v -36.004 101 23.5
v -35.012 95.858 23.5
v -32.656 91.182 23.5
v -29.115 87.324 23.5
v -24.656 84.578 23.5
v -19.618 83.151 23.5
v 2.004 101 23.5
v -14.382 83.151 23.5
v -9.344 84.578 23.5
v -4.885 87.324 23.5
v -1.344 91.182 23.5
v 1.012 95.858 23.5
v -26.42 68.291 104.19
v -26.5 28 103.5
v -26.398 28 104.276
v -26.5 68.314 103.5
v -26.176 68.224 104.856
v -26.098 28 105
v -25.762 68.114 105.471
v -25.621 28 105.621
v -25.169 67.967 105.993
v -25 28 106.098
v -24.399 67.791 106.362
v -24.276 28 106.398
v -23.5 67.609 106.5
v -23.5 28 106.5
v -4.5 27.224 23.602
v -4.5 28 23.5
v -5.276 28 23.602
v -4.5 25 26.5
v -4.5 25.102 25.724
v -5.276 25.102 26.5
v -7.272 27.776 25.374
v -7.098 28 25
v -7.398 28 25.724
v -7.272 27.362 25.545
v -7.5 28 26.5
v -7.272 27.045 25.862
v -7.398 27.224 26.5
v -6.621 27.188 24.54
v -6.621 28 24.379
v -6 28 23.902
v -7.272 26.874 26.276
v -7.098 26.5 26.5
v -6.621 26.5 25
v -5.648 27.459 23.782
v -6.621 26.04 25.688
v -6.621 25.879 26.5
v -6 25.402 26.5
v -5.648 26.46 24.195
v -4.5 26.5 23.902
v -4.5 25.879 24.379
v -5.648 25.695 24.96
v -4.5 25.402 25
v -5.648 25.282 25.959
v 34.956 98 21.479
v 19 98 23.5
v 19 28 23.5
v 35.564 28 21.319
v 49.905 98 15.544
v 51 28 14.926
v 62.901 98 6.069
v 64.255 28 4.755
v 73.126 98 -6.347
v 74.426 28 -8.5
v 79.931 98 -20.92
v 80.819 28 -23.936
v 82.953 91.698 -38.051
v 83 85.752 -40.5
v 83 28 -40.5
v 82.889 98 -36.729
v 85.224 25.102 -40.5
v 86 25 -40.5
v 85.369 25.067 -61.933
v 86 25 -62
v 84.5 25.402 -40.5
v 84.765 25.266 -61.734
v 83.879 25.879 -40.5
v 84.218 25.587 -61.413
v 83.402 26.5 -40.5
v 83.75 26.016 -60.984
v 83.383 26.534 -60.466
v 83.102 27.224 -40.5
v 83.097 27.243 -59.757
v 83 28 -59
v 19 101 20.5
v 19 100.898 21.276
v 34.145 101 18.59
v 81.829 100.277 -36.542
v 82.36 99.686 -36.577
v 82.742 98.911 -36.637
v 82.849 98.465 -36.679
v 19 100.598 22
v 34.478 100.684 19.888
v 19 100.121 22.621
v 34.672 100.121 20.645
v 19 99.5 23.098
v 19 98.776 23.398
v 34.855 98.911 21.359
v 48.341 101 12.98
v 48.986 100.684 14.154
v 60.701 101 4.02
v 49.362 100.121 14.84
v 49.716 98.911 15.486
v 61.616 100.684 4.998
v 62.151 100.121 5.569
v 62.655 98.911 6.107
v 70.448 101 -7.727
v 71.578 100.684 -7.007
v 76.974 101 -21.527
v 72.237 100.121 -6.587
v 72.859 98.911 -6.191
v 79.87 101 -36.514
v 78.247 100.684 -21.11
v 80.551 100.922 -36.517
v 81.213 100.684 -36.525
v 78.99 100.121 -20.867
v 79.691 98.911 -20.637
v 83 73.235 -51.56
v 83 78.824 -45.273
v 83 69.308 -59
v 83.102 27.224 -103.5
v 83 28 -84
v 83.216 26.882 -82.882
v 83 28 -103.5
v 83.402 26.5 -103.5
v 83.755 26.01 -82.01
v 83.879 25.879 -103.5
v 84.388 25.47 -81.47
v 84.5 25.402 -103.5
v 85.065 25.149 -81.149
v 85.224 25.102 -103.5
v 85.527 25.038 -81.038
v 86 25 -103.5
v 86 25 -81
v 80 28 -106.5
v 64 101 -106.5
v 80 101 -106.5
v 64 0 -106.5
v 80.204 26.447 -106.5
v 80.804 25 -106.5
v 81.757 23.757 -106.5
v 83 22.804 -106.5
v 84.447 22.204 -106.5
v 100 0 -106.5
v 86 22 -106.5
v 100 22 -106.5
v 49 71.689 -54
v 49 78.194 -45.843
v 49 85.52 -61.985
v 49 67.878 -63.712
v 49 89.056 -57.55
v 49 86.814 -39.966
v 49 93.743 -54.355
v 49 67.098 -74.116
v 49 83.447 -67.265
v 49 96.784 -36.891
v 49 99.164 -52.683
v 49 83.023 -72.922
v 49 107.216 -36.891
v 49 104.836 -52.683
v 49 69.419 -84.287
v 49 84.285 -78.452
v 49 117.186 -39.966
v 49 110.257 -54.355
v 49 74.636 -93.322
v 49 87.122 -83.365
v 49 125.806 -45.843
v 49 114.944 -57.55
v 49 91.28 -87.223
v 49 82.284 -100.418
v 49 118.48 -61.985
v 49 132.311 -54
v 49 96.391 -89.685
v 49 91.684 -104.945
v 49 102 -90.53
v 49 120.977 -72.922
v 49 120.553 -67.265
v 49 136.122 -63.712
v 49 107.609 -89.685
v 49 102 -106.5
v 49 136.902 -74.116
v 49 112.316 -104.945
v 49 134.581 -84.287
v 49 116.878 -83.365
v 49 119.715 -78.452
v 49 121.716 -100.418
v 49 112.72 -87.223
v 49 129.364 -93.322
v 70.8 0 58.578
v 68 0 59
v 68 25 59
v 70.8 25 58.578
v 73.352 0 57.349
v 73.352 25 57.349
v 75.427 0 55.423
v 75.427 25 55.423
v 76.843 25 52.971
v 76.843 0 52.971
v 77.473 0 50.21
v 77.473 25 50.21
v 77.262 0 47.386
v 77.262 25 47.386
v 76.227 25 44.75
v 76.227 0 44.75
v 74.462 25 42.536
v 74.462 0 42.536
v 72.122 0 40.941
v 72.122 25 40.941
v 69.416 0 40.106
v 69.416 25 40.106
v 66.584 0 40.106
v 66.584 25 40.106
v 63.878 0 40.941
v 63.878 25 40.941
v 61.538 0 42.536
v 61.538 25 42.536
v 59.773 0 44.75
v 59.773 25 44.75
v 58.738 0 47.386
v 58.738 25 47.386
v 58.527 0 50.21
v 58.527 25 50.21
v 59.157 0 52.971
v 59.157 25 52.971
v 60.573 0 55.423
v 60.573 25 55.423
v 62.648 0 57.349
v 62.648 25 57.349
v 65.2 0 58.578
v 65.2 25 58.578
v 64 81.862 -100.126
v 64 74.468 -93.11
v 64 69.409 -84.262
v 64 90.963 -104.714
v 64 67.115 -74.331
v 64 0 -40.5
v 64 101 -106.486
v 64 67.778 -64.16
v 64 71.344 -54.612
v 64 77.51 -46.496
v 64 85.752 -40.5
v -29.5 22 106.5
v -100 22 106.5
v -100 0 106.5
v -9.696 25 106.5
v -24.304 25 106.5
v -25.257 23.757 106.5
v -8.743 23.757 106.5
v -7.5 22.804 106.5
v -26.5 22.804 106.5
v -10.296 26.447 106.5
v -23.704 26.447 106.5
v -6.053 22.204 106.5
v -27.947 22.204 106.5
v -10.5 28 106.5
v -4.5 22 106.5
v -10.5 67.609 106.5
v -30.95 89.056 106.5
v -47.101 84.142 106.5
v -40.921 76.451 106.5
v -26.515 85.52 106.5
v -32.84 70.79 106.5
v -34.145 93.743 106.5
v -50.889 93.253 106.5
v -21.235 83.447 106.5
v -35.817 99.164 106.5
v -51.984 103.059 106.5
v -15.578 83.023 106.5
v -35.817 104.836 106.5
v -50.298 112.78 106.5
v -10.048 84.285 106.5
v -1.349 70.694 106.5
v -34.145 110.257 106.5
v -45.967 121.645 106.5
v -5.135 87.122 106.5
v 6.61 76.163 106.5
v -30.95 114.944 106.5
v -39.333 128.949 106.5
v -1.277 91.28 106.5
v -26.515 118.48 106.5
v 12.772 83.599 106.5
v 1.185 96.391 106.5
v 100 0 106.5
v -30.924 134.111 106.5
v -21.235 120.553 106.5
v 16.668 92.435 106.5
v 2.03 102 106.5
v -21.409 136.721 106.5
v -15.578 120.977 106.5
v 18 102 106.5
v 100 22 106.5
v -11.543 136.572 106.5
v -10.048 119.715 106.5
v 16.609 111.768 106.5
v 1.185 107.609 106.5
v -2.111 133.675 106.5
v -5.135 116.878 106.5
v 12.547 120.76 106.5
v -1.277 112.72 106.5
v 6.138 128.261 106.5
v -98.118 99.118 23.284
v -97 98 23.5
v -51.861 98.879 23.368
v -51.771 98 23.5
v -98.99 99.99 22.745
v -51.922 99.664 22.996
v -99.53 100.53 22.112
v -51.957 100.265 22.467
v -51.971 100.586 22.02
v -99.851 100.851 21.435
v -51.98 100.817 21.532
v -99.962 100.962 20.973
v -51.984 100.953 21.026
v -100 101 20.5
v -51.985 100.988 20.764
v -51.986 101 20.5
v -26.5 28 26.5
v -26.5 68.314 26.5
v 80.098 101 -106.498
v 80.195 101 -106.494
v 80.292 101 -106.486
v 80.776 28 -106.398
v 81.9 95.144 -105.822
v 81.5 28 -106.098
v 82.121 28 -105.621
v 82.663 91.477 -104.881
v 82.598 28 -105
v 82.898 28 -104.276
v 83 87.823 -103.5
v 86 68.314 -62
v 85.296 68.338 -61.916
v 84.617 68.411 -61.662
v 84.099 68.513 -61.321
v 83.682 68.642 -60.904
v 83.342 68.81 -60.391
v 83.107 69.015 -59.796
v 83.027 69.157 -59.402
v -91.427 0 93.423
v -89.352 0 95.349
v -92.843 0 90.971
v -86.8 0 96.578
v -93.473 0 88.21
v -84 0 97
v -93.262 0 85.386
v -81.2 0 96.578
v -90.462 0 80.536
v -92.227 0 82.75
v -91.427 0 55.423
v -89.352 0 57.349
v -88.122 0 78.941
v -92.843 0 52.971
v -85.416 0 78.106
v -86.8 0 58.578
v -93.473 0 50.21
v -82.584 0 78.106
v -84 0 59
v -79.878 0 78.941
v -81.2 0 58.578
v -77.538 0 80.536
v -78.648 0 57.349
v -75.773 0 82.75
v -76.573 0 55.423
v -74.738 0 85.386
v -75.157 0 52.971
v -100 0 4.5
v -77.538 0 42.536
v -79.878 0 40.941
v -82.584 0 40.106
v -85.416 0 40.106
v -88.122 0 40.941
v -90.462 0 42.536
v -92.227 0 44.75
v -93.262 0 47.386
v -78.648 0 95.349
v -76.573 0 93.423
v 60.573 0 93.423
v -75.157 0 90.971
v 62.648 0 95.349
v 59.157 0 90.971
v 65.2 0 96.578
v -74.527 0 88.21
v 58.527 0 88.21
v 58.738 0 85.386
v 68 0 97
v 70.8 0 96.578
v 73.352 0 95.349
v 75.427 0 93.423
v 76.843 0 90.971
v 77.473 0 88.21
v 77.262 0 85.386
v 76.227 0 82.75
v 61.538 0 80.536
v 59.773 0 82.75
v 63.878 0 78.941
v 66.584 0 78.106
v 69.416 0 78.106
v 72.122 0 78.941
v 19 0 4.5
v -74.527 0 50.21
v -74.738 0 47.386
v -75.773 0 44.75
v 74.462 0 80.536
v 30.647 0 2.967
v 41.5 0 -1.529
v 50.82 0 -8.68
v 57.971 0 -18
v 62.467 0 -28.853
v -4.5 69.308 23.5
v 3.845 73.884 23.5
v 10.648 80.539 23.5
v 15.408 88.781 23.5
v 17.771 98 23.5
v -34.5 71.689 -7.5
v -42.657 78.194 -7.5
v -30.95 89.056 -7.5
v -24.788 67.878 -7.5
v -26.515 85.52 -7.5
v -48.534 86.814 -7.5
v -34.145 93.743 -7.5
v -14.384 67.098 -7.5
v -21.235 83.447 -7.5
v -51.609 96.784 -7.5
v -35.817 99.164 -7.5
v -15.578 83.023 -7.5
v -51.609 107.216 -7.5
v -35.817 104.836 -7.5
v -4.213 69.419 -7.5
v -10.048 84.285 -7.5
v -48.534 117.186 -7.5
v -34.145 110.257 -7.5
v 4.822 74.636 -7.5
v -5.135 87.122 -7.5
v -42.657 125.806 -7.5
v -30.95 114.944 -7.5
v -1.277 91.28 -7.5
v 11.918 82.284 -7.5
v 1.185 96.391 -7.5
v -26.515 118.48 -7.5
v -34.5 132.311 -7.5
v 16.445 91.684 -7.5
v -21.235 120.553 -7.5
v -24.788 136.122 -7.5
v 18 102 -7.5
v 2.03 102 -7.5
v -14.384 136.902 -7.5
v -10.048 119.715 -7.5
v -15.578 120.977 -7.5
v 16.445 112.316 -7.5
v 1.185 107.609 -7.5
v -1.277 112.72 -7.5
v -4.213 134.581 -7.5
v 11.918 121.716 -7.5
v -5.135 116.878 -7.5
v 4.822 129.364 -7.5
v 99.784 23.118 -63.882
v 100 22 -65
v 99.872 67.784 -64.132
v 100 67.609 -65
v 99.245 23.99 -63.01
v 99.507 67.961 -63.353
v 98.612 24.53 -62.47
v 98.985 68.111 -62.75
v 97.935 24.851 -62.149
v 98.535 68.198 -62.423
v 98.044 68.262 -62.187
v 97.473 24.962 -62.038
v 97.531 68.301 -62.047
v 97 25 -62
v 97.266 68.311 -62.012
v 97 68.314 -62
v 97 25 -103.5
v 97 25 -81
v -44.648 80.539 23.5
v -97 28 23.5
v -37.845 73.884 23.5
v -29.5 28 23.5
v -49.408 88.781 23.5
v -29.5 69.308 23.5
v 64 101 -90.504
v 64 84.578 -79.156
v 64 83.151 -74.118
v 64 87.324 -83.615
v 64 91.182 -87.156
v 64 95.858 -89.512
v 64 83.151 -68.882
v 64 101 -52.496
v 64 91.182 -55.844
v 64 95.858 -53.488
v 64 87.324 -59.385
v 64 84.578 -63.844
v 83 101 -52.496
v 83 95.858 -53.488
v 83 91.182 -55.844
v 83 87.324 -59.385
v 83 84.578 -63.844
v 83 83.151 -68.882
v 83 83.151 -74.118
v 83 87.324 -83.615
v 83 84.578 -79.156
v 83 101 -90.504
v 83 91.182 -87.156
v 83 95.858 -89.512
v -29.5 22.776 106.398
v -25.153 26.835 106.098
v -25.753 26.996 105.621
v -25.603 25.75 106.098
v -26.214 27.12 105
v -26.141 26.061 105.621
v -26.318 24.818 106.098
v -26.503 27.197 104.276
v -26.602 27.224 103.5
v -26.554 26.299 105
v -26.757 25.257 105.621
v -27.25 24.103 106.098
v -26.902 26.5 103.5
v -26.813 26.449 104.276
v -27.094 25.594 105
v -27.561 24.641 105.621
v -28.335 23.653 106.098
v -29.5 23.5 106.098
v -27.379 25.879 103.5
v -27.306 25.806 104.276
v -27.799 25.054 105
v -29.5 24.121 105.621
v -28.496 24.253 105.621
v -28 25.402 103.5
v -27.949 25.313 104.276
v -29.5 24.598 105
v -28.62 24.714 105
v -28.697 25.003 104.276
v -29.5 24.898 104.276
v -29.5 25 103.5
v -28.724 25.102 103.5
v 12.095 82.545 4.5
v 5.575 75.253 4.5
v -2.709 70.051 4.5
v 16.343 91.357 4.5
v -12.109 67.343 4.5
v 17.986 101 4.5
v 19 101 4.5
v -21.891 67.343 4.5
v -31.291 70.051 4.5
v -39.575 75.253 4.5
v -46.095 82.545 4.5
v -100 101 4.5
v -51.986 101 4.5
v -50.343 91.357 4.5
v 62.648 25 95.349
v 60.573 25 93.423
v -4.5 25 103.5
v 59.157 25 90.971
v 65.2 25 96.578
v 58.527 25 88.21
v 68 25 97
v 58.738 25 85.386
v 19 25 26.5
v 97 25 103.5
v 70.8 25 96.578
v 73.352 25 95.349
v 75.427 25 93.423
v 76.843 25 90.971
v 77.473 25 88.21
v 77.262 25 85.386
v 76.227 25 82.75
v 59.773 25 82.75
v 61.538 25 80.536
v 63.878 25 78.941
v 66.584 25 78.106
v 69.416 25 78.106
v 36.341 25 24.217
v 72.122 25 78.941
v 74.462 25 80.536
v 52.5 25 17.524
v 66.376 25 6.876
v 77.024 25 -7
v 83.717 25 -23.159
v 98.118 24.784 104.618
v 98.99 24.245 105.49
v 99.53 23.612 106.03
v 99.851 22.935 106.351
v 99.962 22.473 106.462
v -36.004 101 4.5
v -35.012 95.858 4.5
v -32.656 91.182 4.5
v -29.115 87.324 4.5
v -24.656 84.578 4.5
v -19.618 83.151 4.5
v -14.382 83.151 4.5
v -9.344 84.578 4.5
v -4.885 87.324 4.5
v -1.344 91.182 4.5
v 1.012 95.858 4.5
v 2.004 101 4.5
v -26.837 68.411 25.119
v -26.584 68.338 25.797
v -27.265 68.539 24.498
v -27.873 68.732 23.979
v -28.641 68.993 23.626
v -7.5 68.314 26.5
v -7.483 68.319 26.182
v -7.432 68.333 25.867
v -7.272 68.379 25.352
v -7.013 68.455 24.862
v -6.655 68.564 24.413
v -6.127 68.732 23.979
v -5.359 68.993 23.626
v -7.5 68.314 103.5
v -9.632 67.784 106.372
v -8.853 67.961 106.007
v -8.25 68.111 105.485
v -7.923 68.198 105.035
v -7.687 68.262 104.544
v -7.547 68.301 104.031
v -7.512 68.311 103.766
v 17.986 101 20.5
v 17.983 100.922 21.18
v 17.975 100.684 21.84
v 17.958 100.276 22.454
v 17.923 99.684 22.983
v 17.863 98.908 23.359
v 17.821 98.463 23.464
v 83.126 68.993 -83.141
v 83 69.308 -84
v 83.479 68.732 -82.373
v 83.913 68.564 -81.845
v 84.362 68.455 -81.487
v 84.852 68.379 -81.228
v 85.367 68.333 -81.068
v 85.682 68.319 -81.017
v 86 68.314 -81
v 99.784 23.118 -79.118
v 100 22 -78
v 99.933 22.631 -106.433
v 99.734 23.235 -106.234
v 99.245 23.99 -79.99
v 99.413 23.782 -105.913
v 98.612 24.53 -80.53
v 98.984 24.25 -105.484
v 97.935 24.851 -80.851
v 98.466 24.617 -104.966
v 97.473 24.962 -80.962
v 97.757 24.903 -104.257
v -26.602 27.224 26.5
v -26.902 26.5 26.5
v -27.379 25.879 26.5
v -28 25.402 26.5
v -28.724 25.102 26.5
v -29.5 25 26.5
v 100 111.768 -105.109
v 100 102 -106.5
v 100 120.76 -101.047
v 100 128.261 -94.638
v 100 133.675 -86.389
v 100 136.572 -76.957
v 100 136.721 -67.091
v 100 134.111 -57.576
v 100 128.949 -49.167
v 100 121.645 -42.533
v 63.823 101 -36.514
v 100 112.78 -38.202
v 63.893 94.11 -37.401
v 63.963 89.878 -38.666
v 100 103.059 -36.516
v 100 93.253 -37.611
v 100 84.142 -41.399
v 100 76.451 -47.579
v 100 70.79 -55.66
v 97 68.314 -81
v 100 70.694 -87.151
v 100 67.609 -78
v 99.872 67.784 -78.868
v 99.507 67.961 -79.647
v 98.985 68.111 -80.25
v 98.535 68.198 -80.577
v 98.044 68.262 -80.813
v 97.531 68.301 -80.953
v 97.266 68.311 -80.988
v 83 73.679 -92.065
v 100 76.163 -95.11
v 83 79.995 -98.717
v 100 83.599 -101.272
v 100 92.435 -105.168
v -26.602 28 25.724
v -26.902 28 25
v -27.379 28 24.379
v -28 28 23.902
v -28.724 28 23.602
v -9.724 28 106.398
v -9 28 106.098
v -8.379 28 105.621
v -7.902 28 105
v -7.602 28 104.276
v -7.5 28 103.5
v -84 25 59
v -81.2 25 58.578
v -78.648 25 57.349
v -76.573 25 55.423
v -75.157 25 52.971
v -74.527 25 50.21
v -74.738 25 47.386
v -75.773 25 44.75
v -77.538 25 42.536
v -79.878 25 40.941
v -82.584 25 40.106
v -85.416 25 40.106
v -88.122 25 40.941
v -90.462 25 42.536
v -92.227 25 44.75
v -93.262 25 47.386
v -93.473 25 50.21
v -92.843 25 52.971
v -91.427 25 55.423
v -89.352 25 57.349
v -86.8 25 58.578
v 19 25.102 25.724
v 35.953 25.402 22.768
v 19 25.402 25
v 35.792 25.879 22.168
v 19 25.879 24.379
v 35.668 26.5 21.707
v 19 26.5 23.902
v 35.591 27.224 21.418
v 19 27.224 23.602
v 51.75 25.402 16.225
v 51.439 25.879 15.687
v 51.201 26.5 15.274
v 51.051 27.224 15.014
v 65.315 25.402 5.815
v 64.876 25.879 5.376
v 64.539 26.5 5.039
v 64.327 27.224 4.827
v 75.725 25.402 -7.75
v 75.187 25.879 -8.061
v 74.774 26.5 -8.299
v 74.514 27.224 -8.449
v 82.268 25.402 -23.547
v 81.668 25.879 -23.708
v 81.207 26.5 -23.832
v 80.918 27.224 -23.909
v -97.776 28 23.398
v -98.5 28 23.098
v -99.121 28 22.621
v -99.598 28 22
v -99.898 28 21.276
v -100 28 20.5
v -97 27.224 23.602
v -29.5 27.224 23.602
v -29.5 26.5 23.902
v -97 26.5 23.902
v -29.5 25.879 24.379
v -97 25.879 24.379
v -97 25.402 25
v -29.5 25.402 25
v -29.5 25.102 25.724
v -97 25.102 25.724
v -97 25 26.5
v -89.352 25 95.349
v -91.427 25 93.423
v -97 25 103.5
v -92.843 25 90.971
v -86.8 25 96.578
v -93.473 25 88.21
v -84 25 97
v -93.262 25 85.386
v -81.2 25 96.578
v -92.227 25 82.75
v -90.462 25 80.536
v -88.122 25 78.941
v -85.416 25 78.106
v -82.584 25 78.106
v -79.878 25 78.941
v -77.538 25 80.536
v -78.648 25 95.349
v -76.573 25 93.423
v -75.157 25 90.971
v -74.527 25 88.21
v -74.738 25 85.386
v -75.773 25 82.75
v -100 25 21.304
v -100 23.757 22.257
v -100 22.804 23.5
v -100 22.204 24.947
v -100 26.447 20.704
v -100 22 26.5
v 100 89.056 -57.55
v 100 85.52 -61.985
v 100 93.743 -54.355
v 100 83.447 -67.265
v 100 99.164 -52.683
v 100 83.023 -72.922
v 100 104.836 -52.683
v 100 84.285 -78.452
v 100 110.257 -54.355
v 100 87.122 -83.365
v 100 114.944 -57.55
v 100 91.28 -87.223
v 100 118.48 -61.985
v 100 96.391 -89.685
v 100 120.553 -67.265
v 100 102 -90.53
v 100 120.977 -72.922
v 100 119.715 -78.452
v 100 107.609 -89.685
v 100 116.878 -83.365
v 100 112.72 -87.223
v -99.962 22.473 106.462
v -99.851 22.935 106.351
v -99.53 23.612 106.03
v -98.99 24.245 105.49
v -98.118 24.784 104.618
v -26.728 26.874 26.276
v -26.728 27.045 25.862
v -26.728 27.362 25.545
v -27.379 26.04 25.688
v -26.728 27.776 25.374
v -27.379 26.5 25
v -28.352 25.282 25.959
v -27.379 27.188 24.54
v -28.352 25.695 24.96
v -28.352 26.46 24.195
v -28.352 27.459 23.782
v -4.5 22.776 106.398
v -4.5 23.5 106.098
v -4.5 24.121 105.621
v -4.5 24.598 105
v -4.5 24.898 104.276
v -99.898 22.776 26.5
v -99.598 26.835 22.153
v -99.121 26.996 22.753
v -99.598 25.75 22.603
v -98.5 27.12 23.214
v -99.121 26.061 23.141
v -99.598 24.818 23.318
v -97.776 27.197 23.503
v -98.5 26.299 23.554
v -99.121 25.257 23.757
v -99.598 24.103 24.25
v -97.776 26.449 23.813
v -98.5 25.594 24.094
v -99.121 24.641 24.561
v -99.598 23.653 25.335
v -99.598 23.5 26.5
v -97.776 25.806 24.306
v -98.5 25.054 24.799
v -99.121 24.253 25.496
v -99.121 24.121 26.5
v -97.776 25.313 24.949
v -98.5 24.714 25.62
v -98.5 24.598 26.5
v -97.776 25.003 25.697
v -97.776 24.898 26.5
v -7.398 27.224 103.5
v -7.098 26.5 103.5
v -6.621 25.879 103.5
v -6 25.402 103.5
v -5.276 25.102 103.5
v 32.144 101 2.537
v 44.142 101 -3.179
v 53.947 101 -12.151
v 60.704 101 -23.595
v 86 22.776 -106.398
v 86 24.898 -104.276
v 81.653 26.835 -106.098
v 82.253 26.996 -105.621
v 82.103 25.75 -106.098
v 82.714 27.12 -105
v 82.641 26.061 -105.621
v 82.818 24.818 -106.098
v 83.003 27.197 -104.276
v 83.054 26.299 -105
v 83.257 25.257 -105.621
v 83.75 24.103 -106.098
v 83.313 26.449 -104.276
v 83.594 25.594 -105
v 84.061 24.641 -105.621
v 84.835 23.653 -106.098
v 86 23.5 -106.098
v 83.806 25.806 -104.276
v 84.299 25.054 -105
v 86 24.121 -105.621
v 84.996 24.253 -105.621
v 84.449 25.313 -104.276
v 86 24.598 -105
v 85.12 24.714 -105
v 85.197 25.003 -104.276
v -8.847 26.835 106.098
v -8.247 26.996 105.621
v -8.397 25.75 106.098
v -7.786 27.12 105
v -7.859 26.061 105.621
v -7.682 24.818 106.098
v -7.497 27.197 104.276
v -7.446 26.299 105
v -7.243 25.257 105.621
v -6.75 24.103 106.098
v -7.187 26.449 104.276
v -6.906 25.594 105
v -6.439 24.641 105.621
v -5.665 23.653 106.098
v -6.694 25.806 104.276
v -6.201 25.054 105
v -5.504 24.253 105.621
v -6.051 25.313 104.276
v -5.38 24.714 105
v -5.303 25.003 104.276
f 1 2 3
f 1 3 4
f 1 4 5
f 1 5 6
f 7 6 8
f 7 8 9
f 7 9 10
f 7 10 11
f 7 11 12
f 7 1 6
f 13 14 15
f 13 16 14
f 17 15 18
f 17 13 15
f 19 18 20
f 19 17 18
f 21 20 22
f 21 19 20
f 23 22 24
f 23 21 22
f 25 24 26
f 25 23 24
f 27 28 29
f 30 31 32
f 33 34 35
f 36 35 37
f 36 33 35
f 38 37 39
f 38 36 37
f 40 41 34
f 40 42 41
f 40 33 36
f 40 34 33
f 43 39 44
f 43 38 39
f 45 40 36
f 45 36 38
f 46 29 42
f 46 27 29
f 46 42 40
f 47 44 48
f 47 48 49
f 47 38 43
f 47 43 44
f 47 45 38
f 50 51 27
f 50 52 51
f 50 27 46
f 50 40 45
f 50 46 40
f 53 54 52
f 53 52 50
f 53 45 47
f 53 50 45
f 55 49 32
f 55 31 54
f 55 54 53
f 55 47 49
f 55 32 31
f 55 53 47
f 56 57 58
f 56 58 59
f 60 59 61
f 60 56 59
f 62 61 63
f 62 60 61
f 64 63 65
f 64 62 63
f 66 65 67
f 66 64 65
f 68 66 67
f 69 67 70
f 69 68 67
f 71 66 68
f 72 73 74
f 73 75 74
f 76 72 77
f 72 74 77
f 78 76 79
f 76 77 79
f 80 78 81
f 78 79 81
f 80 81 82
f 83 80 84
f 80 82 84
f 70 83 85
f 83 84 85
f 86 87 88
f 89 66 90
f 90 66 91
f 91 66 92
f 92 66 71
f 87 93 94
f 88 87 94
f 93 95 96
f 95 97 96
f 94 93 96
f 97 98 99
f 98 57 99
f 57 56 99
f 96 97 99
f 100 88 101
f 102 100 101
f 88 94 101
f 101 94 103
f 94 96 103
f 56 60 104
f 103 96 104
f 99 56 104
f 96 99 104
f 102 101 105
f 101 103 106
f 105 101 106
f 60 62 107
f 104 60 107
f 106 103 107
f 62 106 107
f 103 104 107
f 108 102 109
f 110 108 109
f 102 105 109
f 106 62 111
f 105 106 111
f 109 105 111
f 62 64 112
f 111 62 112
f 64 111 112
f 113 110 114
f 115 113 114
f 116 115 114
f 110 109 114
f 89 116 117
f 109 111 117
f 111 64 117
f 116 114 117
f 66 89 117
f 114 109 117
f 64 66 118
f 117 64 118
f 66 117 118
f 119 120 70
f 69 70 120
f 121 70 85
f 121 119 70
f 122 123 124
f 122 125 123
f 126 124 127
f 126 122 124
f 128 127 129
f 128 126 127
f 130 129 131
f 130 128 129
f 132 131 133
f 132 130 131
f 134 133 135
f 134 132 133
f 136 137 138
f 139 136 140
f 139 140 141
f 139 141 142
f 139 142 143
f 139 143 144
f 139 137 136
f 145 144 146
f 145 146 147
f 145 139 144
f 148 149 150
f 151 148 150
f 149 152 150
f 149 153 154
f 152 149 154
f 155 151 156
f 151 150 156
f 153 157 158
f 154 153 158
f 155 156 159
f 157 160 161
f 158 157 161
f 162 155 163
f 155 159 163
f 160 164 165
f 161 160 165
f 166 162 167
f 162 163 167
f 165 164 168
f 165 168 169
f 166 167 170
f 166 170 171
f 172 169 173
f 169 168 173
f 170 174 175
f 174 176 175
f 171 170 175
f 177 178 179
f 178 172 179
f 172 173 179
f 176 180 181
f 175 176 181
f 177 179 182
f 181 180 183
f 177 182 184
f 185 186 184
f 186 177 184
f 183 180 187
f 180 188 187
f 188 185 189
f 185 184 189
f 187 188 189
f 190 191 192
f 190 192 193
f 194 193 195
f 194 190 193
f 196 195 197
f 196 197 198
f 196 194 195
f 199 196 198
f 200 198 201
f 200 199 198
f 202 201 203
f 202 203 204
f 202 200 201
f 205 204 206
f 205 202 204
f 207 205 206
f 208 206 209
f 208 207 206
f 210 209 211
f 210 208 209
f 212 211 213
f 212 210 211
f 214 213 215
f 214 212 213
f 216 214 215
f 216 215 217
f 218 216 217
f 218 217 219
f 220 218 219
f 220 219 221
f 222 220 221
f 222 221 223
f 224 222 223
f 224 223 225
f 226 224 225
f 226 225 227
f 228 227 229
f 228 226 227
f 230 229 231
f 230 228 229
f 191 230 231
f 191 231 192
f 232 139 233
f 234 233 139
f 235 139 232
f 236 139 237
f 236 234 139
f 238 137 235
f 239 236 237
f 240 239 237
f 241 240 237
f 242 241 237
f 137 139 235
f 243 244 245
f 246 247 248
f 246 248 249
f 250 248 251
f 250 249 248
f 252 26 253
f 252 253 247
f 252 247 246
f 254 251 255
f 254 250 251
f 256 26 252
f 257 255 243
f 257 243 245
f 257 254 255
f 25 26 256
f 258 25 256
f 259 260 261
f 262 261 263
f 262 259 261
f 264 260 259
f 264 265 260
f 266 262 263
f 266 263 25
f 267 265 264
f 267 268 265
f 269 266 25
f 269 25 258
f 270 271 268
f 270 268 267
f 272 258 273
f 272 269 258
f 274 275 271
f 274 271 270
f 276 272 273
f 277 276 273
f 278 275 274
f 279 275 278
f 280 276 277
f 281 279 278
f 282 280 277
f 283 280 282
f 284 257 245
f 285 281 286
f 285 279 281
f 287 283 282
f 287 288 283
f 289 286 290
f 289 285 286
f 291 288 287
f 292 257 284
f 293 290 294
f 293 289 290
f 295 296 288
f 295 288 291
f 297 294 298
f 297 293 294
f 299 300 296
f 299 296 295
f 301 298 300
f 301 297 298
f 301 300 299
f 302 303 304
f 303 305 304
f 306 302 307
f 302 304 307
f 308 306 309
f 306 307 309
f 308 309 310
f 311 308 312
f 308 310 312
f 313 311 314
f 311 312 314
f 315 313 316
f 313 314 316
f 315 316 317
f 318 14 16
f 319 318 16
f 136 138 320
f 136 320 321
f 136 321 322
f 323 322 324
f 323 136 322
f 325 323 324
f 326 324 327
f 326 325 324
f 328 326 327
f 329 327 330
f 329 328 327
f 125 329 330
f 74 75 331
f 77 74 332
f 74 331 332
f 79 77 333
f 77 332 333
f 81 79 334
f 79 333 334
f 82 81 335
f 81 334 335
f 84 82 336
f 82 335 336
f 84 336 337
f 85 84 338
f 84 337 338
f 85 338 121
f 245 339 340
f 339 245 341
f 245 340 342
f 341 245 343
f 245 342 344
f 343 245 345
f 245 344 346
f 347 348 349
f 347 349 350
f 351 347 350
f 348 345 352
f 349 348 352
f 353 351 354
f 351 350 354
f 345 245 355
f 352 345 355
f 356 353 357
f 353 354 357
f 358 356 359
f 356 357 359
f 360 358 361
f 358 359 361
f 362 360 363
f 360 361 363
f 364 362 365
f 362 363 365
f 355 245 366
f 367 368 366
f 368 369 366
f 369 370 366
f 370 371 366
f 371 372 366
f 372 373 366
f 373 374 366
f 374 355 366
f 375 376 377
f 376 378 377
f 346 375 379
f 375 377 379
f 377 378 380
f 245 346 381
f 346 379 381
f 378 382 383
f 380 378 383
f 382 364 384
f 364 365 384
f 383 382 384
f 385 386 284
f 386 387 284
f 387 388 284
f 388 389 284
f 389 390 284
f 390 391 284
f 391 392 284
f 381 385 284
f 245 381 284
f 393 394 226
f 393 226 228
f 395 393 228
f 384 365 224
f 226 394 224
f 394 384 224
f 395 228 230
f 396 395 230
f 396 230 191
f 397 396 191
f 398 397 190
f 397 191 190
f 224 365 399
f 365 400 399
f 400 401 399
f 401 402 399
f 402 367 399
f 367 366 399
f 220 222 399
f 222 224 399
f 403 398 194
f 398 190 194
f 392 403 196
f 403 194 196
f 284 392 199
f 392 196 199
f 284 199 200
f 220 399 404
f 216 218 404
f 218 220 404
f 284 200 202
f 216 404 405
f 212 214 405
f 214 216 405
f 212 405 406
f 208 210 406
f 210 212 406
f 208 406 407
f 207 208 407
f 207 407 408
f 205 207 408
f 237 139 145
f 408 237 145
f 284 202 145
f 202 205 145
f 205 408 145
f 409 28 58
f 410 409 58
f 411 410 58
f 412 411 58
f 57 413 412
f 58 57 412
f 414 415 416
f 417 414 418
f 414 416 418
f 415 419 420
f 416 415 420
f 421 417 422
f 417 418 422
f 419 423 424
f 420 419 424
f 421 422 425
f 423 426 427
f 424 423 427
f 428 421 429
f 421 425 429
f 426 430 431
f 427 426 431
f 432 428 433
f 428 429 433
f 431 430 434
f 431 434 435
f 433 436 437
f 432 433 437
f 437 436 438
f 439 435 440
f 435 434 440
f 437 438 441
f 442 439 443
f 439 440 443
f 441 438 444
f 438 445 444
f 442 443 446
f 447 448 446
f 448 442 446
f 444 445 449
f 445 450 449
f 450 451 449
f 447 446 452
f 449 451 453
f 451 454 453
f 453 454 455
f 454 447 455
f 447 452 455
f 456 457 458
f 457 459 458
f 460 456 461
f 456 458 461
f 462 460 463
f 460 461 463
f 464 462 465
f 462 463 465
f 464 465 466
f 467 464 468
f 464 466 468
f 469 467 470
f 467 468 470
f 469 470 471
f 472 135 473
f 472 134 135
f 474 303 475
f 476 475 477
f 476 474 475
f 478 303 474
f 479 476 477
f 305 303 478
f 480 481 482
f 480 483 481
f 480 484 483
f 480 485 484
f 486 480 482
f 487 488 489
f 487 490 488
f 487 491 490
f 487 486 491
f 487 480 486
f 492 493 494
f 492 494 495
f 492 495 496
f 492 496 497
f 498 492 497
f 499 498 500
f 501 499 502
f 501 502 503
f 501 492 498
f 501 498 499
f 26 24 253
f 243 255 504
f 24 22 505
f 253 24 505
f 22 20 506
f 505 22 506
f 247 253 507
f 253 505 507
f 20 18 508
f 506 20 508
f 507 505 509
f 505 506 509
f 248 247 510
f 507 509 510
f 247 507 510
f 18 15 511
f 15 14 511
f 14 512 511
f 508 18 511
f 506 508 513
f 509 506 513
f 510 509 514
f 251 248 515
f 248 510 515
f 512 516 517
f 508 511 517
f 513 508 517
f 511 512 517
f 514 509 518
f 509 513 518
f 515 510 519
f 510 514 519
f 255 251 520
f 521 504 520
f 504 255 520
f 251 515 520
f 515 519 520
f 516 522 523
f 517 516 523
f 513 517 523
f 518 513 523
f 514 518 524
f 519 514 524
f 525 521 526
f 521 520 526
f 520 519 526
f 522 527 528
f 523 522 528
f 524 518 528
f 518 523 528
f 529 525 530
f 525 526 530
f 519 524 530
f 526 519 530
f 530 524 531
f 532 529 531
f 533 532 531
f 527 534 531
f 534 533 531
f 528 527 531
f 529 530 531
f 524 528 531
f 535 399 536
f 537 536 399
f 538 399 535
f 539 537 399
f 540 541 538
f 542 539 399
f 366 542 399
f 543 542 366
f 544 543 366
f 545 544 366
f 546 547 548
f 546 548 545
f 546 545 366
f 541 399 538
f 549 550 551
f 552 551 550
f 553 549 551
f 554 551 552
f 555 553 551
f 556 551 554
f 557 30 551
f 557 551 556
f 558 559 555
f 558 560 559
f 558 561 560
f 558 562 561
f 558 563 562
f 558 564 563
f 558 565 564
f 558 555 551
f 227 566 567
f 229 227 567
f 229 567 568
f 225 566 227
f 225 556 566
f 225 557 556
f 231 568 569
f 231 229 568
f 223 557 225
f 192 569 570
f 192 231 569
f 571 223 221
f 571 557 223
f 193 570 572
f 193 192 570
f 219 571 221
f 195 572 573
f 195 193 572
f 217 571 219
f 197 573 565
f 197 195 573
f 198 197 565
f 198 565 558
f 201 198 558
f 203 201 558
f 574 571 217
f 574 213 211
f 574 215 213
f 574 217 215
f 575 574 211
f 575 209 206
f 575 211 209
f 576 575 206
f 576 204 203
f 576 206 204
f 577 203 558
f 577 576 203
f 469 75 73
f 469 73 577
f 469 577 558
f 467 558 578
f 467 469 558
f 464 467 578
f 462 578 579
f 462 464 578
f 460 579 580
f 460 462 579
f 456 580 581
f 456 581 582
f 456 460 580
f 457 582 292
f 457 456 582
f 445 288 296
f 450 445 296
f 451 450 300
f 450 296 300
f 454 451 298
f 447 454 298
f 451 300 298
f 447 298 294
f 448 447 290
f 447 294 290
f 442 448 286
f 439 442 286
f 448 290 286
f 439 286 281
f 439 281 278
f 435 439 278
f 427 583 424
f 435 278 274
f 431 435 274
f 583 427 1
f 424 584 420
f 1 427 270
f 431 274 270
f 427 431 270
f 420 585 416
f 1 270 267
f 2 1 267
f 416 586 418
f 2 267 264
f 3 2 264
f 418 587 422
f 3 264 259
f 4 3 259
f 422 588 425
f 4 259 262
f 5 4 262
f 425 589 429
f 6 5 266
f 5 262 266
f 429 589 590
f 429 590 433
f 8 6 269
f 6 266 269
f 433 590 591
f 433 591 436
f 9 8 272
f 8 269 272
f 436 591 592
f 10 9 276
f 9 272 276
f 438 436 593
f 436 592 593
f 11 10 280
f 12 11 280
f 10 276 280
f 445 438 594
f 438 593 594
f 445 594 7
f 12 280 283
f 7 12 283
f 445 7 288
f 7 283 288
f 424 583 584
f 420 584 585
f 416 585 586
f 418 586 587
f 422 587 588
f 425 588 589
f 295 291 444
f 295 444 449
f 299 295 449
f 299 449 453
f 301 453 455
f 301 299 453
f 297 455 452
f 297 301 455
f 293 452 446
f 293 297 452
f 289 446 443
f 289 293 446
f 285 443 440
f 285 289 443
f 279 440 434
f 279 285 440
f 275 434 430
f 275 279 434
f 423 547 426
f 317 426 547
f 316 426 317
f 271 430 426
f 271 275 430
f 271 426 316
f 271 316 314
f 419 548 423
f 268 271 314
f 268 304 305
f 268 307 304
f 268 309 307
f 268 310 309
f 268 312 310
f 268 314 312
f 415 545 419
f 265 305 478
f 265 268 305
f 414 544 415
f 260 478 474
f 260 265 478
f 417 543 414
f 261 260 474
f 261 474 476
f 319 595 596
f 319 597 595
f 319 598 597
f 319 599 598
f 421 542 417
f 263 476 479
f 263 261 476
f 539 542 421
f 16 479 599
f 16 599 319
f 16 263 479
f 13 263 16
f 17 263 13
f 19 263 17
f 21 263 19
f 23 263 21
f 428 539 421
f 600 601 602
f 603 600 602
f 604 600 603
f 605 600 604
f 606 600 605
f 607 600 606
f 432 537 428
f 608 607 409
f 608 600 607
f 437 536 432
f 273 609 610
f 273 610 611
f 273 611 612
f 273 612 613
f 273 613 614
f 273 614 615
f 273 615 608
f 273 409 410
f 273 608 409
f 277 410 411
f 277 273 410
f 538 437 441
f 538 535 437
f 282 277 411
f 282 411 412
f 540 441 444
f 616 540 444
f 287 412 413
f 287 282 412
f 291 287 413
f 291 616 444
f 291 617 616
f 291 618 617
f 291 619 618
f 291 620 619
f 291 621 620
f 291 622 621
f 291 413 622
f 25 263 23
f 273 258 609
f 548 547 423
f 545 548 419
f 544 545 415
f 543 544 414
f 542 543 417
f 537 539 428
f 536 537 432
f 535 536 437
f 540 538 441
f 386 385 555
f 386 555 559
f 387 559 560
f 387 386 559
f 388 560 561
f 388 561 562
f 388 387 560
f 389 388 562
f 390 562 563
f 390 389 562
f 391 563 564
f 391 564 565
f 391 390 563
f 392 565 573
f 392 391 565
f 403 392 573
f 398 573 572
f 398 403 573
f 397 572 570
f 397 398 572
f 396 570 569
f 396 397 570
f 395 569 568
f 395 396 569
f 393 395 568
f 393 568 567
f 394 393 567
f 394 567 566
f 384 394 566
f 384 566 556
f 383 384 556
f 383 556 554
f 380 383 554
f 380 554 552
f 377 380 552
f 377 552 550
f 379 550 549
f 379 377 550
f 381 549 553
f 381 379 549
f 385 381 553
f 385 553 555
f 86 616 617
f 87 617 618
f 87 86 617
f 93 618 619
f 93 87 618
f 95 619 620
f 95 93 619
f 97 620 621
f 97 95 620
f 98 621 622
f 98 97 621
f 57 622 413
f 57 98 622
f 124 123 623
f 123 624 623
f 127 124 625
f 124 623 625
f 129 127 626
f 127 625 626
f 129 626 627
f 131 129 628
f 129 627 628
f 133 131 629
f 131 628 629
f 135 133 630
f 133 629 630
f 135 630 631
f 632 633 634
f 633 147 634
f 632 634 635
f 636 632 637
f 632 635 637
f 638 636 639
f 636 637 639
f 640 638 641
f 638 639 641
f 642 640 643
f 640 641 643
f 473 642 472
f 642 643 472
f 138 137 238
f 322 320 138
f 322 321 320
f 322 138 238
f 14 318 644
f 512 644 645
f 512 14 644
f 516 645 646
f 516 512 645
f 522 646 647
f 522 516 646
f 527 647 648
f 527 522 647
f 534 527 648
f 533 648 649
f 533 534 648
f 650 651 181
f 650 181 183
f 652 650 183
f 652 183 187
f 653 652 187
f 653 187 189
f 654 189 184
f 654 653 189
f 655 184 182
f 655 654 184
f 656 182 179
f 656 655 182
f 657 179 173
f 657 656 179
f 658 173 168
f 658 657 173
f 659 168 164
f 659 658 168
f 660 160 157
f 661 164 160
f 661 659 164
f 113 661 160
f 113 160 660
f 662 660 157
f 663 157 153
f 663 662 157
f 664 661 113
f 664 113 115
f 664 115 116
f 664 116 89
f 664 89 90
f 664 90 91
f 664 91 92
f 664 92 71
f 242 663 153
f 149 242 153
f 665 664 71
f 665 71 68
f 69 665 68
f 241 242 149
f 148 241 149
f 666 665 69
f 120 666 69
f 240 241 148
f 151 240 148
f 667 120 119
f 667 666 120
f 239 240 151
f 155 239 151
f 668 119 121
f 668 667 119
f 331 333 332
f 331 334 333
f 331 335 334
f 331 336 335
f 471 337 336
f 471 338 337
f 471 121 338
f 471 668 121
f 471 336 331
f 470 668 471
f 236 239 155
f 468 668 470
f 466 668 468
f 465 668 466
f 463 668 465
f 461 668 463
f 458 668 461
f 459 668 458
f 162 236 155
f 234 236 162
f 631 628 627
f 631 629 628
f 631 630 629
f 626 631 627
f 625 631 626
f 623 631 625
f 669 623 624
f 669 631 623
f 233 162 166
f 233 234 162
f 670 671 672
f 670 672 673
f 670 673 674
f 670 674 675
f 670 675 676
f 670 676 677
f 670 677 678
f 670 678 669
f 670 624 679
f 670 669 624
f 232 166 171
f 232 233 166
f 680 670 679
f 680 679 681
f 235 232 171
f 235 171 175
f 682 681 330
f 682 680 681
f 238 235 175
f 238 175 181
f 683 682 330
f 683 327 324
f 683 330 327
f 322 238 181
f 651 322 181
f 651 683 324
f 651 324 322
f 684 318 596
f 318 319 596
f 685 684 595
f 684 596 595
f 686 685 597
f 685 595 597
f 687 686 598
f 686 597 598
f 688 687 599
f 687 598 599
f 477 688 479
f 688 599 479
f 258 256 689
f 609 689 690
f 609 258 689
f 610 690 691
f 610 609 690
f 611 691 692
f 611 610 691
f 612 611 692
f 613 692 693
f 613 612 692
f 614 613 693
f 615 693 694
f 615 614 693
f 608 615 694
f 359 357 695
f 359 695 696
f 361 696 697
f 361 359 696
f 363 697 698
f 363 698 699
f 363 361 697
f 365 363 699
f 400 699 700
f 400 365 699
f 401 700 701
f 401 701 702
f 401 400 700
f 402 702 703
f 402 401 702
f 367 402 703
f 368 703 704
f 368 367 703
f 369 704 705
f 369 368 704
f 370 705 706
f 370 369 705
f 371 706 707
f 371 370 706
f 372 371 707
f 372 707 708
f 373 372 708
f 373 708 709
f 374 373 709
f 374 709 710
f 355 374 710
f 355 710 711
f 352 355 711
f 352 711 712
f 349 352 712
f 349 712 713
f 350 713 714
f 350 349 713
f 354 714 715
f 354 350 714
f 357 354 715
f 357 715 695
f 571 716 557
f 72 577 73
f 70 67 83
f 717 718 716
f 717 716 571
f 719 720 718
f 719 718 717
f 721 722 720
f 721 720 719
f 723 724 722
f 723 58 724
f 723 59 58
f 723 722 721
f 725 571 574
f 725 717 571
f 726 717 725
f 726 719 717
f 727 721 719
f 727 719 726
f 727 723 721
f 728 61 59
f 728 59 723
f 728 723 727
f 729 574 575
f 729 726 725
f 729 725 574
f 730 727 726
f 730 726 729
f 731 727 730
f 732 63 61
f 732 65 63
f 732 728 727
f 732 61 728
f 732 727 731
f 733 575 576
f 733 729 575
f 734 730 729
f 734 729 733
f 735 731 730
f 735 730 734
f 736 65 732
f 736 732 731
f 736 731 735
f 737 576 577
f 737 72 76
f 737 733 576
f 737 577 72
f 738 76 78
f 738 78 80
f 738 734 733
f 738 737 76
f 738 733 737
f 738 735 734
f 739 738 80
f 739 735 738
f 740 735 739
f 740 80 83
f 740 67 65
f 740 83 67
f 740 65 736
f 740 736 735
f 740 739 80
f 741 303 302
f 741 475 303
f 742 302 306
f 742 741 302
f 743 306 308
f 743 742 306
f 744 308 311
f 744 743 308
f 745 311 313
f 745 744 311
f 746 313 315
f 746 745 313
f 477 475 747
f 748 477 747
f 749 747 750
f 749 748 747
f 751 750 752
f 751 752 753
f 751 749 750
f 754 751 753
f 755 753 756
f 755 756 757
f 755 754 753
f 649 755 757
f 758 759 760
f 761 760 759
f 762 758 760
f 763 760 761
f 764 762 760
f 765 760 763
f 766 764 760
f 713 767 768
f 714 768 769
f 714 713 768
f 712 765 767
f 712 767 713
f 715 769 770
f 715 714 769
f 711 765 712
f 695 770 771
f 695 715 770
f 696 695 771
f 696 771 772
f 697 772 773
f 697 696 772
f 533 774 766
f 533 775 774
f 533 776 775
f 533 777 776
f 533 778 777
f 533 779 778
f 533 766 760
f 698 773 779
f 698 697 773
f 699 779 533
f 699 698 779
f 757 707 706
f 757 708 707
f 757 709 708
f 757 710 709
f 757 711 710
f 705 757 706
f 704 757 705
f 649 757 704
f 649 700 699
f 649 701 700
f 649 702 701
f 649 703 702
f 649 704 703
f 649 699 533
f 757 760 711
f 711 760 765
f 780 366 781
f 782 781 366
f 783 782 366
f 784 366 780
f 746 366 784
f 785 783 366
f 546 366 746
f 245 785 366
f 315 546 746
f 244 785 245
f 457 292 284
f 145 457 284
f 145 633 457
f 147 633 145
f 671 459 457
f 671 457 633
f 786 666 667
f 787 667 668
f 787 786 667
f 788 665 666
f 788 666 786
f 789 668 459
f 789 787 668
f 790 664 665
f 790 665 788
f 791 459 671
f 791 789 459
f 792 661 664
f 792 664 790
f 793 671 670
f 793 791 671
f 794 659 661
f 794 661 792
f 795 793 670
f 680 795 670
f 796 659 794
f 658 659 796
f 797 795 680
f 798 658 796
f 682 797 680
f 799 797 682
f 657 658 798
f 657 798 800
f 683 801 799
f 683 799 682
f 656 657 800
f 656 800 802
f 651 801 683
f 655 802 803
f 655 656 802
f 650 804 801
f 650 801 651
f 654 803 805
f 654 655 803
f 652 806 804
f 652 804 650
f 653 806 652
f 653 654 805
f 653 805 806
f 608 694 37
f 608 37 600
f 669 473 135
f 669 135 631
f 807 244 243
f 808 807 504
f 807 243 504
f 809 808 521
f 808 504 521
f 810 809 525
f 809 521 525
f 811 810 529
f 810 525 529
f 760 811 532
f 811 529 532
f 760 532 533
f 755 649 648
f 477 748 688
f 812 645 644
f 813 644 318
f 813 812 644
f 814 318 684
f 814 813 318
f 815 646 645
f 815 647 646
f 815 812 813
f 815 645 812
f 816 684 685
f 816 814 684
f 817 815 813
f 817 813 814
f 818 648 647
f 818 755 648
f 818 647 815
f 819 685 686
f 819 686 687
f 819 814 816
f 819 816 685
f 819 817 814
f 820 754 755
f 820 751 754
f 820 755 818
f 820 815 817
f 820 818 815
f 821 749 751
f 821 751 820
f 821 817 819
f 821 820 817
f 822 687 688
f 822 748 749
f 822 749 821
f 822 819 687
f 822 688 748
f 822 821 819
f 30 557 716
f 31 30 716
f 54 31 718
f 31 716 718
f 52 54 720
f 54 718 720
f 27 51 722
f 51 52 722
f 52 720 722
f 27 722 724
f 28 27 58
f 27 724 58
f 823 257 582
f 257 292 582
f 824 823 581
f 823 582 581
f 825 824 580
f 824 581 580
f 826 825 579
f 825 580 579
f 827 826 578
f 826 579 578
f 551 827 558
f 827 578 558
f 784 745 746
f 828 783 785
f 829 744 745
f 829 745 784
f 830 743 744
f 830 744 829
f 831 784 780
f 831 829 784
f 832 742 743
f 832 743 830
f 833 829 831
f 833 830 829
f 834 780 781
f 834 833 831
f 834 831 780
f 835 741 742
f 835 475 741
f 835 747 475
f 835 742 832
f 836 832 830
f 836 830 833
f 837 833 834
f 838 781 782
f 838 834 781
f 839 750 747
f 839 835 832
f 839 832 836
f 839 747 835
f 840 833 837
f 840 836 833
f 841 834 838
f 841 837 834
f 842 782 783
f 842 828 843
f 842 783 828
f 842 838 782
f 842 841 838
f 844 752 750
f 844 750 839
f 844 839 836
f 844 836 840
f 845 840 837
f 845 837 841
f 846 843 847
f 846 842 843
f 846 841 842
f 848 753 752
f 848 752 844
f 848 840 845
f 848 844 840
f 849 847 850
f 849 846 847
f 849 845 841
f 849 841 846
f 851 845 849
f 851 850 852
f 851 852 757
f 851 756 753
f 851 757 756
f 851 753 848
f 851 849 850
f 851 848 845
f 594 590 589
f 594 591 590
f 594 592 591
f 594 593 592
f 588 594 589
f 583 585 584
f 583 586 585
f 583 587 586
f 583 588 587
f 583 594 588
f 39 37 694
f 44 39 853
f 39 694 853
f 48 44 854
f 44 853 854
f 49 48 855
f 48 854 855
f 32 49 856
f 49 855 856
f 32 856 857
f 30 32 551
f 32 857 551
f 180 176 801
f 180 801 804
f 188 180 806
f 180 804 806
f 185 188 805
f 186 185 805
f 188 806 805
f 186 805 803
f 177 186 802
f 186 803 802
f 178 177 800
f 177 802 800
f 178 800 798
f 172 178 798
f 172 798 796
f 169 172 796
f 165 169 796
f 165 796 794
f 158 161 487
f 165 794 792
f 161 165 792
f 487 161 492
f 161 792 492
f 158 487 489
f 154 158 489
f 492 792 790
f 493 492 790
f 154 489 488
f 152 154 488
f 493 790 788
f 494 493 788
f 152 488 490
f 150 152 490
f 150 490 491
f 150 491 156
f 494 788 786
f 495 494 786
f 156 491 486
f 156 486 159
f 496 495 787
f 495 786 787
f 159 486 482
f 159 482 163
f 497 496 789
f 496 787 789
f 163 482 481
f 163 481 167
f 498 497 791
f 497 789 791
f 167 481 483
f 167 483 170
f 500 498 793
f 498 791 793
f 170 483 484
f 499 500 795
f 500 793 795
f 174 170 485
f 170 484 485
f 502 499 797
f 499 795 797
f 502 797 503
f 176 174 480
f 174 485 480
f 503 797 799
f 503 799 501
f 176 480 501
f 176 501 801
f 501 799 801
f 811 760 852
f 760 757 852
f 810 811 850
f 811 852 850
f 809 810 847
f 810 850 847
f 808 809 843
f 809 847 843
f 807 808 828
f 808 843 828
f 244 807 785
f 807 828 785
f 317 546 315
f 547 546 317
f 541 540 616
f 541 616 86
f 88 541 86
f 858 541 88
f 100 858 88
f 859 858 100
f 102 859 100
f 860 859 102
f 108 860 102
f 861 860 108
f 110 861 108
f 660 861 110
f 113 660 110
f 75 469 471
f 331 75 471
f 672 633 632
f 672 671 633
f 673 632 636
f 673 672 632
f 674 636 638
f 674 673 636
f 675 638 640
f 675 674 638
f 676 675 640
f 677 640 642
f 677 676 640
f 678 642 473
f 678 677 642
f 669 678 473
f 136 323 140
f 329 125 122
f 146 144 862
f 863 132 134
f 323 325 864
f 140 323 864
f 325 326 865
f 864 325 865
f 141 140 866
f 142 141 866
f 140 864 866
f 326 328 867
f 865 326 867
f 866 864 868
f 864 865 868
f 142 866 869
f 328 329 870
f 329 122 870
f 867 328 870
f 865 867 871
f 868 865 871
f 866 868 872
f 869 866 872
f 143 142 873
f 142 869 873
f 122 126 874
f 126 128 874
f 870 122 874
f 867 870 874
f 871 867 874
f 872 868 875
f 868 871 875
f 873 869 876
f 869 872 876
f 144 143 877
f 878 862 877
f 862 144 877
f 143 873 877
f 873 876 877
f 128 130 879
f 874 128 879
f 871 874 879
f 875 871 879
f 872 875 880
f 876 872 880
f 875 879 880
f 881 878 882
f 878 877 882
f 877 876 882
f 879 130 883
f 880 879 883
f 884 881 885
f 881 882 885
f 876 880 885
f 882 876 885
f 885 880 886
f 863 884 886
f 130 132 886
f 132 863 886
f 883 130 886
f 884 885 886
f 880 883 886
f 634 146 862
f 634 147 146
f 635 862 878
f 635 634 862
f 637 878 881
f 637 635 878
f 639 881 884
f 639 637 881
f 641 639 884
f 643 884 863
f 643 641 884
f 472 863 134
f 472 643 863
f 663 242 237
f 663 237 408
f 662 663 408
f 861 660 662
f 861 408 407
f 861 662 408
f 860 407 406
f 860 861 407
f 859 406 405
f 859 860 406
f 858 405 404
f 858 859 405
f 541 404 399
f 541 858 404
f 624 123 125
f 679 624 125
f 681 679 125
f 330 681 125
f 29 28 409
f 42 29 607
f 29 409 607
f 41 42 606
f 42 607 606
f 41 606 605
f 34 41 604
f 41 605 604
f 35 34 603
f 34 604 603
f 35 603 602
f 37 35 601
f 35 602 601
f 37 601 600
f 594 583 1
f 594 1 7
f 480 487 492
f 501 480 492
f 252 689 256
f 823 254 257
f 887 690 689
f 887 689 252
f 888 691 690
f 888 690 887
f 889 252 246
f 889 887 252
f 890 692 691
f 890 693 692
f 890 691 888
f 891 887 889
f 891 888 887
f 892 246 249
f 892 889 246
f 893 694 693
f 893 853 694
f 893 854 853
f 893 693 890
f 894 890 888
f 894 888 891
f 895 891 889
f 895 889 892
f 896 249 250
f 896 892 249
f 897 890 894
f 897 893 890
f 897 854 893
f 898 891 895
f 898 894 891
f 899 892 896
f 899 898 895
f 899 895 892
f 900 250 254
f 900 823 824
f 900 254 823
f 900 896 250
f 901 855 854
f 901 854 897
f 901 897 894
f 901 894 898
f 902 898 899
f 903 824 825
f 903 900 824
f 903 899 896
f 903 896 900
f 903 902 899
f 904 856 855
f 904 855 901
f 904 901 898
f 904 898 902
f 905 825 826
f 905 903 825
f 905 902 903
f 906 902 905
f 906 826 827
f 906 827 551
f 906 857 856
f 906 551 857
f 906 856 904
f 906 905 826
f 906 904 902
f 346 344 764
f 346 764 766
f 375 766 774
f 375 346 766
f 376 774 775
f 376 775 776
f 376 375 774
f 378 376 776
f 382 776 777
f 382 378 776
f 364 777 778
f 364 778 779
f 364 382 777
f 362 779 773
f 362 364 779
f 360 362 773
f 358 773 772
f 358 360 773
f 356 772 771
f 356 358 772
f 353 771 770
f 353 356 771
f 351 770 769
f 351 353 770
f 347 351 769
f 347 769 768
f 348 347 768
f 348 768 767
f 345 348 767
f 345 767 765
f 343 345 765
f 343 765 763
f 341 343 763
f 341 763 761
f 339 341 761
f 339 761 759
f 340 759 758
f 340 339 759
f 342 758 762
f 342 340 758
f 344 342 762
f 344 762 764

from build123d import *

# Parameters (mm, degrees)
SKETCH1_W           = 200
SKETCH1_H           = 213
SKETCH1_R           = 9.5
BOSS_EXTRUDE1_DEPTH = 25
SKETCH2_R           = 35
SKETCH2_R_2         = 19.03
BOSS_EXTRUDE2_DEPTH = 114
SKETCH3_R           = 35
SKETCH3_R_2         = 19.03
BOSS_EXTRUDE3_DEPTH = 51
CUT_EXTRUDE1_DEPTH  = 51
BOSS_EXTRUDE4_START = 76
BOSS_EXTRUDE4_DEPTH = 76
SKETCH5_W           = 19
SKETCH5_H           = 46.369491486
BOSS_EXTRUDE5_DEPTH = 17
BOSS_EXTRUDE6_START = -83
SKETCH6_W           = 19
SKETCH6_H           = 46.471332412
BOSS_EXTRUDE6_DEPTH = 83
FILLET3_R           = 3


with BuildPart() as part:
    # Sketch1 → Boss-Extrude1 (new body)
    with BuildSketch(Plane(origin=(0, 0, 0), x_dir=(1, 0, 0), z_dir=(0, 1, 0))):
        Rectangle(SKETCH1_W, SKETCH1_H)
        with Locations(Location((68, -49.5, 0), (0, 0, 270))):
            Circle(SKETCH1_R, mode=Mode.SUBTRACT)
        with Locations(Location((68, -87.5, 0), (0, 0, 270))):
            Circle(SKETCH1_R, mode=Mode.SUBTRACT)
        with Locations(Location((-84, -49.5, 0), (0, 0, 270))):
            Circle(SKETCH1_R, mode=Mode.SUBTRACT)
        with Locations(Location((-84, -87.5, 0), (0, 0, 270))):
            Circle(SKETCH1_R, mode=Mode.SUBTRACT)
    extrude(amount=BOSS_EXTRUDE1_DEPTH)

    # Sketch4 → Cut-Extrude1 (cut)
    with BuildSketch(Plane(origin=(0, 25, 0), x_dir=(1, 0, 0), z_dir=(0, 1, 0))):
        with BuildLine():
            Line((-100, 106.5), (-100, -4.5))
            Line((-100, -4.5), (19, -4.5))
            ThreePointArc((19, -4.5), (50.819805153, 8.680194847), (64, 40.5))
            Line((64, 40.5), (64, 106.5))
            Line((64, 106.5), (-100, 106.5))
        make_face()
    extrude(amount=-CUT_EXTRUDE1_DEPTH, mode=Mode.SUBTRACT)



with BuildPart() as body_2:
    # Sketch2 → Boss-Extrude2 (new body)
    with BuildSketch(Plane.XY.offset(106.5)):
        with Locations((-17, 102)):
            Circle(SKETCH2_R)
        with Locations((-17, 102)):
            Circle(SKETCH2_R_2, mode=Mode.SUBTRACT)
    extrude(amount=-BOSS_EXTRUDE2_DEPTH)


with BuildPart() as body_3:
    # Sketch3 → Boss-Extrude3 (new body)
    with BuildSketch(Plane(origin=(100, 0, 0), x_dir=(0, 0, -1), z_dir=(1, 0, 0))):
        with Locations((71.5, 102)):
            Circle(SKETCH3_R)
        with Locations((71.5, 102)):
            Circle(SKETCH3_R_2, mode=Mode.SUBTRACT)
    extrude(amount=-BOSS_EXTRUDE3_DEPTH)


with BuildPart() as part_1:
    add(part.part)

    add(body_2.part)  # Boss-Extrude4 merges body 2

    add(body_3.part)  # Boss-Extrude4 merges body 3
    # Sketch4<3> → Boss-Extrude4 (add)
    with BuildSketch(Plane(origin=(0, 25, 0), x_dir=(1, 0, 0), z_dir=(0, 1, 0)).offset(BOSS_EXTRUDE4_START)):
        with BuildLine():
            Line((-100, -4.5), (-100, -23.5))
            Line((-100, -23.5), (19, -23.5))
            ThreePointArc((19, -23.5), (64.254833996, -4.754833996), (83, 40.5))
            Line((83, 40.5), (83, 106.5))
            Line((83, 106.5), (64, 106.5))
            Line((64, 106.5), (64, 40.5))
            ThreePointArc((64, 40.5), (50.819805153, 8.680194847), (19, -4.5))
            Line((19, -4.5), (-100, -4.5))
        make_face()
    extrude(amount=-BOSS_EXTRUDE4_DEPTH)

    # Sketch5 → Boss-Extrude5 (add)
    with BuildSketch(Plane(origin=(100, 0, 0), x_dir=(0, 0, -1), z_dir=(1, 0, 0))):
        with Locations((71.5, 48.184745743)):
            Rectangle(SKETCH5_W, SKETCH5_H)
    extrude(amount=-BOSS_EXTRUDE5_DEPTH)

    # Sketch6 → Boss-Extrude6 (add)
    with BuildSketch(Plane.XY.offset(106.5).offset(BOSS_EXTRUDE6_START)):
        with Locations((-17, 48.235666206)):
            Rectangle(SKETCH6_W, SKETCH6_H)
    extrude(amount=BOSS_EXTRUDE6_DEPTH)

    # Fillet3
    fillet3_edges = [part_1.edges().sort_by_distance(p)[0] for p in [
        (83, 63, -106.5),
        (-7.5, 46.656974737, 106.5),
        (-26.5, 46.656974737, 106.5),
        (-100, 25, 65),
        (18.492855685, 101, 23.5),
        (83, 25, -51.25),
        (5.75, 25, 23.5),
        (100, 25, -93.75),
        (91.5, 25, -106.5),
        (83, 25, -93.75),
        (83, 46.656974737, -81),
        (100, 46.656974737, -81),
        (100, 46.656974737, -62),
        (83, 46.656974737, -62),
        (62.82302176, 101, 6.142713941),
        (64.254833996, 25, 4.754833996),
        (100, 25, 22.25),
        (46.25, 25, 106.5),
        (-7.5, 46.656974737, 23.5),
        (-7.5, 25, 65),
        (-63.25, 25, 106.5),
        (-63.25, 25, 23.5),
        (-26.5, 25, 65),
        (-26.5, 46.656974737, 23.5),
        (-100, 63, 23.5),
        (-75.992855685, 101, 23.5),
    ]]
    fillet(fillet3_edges, radius=FILLET3_R)


solid = part_1.part
